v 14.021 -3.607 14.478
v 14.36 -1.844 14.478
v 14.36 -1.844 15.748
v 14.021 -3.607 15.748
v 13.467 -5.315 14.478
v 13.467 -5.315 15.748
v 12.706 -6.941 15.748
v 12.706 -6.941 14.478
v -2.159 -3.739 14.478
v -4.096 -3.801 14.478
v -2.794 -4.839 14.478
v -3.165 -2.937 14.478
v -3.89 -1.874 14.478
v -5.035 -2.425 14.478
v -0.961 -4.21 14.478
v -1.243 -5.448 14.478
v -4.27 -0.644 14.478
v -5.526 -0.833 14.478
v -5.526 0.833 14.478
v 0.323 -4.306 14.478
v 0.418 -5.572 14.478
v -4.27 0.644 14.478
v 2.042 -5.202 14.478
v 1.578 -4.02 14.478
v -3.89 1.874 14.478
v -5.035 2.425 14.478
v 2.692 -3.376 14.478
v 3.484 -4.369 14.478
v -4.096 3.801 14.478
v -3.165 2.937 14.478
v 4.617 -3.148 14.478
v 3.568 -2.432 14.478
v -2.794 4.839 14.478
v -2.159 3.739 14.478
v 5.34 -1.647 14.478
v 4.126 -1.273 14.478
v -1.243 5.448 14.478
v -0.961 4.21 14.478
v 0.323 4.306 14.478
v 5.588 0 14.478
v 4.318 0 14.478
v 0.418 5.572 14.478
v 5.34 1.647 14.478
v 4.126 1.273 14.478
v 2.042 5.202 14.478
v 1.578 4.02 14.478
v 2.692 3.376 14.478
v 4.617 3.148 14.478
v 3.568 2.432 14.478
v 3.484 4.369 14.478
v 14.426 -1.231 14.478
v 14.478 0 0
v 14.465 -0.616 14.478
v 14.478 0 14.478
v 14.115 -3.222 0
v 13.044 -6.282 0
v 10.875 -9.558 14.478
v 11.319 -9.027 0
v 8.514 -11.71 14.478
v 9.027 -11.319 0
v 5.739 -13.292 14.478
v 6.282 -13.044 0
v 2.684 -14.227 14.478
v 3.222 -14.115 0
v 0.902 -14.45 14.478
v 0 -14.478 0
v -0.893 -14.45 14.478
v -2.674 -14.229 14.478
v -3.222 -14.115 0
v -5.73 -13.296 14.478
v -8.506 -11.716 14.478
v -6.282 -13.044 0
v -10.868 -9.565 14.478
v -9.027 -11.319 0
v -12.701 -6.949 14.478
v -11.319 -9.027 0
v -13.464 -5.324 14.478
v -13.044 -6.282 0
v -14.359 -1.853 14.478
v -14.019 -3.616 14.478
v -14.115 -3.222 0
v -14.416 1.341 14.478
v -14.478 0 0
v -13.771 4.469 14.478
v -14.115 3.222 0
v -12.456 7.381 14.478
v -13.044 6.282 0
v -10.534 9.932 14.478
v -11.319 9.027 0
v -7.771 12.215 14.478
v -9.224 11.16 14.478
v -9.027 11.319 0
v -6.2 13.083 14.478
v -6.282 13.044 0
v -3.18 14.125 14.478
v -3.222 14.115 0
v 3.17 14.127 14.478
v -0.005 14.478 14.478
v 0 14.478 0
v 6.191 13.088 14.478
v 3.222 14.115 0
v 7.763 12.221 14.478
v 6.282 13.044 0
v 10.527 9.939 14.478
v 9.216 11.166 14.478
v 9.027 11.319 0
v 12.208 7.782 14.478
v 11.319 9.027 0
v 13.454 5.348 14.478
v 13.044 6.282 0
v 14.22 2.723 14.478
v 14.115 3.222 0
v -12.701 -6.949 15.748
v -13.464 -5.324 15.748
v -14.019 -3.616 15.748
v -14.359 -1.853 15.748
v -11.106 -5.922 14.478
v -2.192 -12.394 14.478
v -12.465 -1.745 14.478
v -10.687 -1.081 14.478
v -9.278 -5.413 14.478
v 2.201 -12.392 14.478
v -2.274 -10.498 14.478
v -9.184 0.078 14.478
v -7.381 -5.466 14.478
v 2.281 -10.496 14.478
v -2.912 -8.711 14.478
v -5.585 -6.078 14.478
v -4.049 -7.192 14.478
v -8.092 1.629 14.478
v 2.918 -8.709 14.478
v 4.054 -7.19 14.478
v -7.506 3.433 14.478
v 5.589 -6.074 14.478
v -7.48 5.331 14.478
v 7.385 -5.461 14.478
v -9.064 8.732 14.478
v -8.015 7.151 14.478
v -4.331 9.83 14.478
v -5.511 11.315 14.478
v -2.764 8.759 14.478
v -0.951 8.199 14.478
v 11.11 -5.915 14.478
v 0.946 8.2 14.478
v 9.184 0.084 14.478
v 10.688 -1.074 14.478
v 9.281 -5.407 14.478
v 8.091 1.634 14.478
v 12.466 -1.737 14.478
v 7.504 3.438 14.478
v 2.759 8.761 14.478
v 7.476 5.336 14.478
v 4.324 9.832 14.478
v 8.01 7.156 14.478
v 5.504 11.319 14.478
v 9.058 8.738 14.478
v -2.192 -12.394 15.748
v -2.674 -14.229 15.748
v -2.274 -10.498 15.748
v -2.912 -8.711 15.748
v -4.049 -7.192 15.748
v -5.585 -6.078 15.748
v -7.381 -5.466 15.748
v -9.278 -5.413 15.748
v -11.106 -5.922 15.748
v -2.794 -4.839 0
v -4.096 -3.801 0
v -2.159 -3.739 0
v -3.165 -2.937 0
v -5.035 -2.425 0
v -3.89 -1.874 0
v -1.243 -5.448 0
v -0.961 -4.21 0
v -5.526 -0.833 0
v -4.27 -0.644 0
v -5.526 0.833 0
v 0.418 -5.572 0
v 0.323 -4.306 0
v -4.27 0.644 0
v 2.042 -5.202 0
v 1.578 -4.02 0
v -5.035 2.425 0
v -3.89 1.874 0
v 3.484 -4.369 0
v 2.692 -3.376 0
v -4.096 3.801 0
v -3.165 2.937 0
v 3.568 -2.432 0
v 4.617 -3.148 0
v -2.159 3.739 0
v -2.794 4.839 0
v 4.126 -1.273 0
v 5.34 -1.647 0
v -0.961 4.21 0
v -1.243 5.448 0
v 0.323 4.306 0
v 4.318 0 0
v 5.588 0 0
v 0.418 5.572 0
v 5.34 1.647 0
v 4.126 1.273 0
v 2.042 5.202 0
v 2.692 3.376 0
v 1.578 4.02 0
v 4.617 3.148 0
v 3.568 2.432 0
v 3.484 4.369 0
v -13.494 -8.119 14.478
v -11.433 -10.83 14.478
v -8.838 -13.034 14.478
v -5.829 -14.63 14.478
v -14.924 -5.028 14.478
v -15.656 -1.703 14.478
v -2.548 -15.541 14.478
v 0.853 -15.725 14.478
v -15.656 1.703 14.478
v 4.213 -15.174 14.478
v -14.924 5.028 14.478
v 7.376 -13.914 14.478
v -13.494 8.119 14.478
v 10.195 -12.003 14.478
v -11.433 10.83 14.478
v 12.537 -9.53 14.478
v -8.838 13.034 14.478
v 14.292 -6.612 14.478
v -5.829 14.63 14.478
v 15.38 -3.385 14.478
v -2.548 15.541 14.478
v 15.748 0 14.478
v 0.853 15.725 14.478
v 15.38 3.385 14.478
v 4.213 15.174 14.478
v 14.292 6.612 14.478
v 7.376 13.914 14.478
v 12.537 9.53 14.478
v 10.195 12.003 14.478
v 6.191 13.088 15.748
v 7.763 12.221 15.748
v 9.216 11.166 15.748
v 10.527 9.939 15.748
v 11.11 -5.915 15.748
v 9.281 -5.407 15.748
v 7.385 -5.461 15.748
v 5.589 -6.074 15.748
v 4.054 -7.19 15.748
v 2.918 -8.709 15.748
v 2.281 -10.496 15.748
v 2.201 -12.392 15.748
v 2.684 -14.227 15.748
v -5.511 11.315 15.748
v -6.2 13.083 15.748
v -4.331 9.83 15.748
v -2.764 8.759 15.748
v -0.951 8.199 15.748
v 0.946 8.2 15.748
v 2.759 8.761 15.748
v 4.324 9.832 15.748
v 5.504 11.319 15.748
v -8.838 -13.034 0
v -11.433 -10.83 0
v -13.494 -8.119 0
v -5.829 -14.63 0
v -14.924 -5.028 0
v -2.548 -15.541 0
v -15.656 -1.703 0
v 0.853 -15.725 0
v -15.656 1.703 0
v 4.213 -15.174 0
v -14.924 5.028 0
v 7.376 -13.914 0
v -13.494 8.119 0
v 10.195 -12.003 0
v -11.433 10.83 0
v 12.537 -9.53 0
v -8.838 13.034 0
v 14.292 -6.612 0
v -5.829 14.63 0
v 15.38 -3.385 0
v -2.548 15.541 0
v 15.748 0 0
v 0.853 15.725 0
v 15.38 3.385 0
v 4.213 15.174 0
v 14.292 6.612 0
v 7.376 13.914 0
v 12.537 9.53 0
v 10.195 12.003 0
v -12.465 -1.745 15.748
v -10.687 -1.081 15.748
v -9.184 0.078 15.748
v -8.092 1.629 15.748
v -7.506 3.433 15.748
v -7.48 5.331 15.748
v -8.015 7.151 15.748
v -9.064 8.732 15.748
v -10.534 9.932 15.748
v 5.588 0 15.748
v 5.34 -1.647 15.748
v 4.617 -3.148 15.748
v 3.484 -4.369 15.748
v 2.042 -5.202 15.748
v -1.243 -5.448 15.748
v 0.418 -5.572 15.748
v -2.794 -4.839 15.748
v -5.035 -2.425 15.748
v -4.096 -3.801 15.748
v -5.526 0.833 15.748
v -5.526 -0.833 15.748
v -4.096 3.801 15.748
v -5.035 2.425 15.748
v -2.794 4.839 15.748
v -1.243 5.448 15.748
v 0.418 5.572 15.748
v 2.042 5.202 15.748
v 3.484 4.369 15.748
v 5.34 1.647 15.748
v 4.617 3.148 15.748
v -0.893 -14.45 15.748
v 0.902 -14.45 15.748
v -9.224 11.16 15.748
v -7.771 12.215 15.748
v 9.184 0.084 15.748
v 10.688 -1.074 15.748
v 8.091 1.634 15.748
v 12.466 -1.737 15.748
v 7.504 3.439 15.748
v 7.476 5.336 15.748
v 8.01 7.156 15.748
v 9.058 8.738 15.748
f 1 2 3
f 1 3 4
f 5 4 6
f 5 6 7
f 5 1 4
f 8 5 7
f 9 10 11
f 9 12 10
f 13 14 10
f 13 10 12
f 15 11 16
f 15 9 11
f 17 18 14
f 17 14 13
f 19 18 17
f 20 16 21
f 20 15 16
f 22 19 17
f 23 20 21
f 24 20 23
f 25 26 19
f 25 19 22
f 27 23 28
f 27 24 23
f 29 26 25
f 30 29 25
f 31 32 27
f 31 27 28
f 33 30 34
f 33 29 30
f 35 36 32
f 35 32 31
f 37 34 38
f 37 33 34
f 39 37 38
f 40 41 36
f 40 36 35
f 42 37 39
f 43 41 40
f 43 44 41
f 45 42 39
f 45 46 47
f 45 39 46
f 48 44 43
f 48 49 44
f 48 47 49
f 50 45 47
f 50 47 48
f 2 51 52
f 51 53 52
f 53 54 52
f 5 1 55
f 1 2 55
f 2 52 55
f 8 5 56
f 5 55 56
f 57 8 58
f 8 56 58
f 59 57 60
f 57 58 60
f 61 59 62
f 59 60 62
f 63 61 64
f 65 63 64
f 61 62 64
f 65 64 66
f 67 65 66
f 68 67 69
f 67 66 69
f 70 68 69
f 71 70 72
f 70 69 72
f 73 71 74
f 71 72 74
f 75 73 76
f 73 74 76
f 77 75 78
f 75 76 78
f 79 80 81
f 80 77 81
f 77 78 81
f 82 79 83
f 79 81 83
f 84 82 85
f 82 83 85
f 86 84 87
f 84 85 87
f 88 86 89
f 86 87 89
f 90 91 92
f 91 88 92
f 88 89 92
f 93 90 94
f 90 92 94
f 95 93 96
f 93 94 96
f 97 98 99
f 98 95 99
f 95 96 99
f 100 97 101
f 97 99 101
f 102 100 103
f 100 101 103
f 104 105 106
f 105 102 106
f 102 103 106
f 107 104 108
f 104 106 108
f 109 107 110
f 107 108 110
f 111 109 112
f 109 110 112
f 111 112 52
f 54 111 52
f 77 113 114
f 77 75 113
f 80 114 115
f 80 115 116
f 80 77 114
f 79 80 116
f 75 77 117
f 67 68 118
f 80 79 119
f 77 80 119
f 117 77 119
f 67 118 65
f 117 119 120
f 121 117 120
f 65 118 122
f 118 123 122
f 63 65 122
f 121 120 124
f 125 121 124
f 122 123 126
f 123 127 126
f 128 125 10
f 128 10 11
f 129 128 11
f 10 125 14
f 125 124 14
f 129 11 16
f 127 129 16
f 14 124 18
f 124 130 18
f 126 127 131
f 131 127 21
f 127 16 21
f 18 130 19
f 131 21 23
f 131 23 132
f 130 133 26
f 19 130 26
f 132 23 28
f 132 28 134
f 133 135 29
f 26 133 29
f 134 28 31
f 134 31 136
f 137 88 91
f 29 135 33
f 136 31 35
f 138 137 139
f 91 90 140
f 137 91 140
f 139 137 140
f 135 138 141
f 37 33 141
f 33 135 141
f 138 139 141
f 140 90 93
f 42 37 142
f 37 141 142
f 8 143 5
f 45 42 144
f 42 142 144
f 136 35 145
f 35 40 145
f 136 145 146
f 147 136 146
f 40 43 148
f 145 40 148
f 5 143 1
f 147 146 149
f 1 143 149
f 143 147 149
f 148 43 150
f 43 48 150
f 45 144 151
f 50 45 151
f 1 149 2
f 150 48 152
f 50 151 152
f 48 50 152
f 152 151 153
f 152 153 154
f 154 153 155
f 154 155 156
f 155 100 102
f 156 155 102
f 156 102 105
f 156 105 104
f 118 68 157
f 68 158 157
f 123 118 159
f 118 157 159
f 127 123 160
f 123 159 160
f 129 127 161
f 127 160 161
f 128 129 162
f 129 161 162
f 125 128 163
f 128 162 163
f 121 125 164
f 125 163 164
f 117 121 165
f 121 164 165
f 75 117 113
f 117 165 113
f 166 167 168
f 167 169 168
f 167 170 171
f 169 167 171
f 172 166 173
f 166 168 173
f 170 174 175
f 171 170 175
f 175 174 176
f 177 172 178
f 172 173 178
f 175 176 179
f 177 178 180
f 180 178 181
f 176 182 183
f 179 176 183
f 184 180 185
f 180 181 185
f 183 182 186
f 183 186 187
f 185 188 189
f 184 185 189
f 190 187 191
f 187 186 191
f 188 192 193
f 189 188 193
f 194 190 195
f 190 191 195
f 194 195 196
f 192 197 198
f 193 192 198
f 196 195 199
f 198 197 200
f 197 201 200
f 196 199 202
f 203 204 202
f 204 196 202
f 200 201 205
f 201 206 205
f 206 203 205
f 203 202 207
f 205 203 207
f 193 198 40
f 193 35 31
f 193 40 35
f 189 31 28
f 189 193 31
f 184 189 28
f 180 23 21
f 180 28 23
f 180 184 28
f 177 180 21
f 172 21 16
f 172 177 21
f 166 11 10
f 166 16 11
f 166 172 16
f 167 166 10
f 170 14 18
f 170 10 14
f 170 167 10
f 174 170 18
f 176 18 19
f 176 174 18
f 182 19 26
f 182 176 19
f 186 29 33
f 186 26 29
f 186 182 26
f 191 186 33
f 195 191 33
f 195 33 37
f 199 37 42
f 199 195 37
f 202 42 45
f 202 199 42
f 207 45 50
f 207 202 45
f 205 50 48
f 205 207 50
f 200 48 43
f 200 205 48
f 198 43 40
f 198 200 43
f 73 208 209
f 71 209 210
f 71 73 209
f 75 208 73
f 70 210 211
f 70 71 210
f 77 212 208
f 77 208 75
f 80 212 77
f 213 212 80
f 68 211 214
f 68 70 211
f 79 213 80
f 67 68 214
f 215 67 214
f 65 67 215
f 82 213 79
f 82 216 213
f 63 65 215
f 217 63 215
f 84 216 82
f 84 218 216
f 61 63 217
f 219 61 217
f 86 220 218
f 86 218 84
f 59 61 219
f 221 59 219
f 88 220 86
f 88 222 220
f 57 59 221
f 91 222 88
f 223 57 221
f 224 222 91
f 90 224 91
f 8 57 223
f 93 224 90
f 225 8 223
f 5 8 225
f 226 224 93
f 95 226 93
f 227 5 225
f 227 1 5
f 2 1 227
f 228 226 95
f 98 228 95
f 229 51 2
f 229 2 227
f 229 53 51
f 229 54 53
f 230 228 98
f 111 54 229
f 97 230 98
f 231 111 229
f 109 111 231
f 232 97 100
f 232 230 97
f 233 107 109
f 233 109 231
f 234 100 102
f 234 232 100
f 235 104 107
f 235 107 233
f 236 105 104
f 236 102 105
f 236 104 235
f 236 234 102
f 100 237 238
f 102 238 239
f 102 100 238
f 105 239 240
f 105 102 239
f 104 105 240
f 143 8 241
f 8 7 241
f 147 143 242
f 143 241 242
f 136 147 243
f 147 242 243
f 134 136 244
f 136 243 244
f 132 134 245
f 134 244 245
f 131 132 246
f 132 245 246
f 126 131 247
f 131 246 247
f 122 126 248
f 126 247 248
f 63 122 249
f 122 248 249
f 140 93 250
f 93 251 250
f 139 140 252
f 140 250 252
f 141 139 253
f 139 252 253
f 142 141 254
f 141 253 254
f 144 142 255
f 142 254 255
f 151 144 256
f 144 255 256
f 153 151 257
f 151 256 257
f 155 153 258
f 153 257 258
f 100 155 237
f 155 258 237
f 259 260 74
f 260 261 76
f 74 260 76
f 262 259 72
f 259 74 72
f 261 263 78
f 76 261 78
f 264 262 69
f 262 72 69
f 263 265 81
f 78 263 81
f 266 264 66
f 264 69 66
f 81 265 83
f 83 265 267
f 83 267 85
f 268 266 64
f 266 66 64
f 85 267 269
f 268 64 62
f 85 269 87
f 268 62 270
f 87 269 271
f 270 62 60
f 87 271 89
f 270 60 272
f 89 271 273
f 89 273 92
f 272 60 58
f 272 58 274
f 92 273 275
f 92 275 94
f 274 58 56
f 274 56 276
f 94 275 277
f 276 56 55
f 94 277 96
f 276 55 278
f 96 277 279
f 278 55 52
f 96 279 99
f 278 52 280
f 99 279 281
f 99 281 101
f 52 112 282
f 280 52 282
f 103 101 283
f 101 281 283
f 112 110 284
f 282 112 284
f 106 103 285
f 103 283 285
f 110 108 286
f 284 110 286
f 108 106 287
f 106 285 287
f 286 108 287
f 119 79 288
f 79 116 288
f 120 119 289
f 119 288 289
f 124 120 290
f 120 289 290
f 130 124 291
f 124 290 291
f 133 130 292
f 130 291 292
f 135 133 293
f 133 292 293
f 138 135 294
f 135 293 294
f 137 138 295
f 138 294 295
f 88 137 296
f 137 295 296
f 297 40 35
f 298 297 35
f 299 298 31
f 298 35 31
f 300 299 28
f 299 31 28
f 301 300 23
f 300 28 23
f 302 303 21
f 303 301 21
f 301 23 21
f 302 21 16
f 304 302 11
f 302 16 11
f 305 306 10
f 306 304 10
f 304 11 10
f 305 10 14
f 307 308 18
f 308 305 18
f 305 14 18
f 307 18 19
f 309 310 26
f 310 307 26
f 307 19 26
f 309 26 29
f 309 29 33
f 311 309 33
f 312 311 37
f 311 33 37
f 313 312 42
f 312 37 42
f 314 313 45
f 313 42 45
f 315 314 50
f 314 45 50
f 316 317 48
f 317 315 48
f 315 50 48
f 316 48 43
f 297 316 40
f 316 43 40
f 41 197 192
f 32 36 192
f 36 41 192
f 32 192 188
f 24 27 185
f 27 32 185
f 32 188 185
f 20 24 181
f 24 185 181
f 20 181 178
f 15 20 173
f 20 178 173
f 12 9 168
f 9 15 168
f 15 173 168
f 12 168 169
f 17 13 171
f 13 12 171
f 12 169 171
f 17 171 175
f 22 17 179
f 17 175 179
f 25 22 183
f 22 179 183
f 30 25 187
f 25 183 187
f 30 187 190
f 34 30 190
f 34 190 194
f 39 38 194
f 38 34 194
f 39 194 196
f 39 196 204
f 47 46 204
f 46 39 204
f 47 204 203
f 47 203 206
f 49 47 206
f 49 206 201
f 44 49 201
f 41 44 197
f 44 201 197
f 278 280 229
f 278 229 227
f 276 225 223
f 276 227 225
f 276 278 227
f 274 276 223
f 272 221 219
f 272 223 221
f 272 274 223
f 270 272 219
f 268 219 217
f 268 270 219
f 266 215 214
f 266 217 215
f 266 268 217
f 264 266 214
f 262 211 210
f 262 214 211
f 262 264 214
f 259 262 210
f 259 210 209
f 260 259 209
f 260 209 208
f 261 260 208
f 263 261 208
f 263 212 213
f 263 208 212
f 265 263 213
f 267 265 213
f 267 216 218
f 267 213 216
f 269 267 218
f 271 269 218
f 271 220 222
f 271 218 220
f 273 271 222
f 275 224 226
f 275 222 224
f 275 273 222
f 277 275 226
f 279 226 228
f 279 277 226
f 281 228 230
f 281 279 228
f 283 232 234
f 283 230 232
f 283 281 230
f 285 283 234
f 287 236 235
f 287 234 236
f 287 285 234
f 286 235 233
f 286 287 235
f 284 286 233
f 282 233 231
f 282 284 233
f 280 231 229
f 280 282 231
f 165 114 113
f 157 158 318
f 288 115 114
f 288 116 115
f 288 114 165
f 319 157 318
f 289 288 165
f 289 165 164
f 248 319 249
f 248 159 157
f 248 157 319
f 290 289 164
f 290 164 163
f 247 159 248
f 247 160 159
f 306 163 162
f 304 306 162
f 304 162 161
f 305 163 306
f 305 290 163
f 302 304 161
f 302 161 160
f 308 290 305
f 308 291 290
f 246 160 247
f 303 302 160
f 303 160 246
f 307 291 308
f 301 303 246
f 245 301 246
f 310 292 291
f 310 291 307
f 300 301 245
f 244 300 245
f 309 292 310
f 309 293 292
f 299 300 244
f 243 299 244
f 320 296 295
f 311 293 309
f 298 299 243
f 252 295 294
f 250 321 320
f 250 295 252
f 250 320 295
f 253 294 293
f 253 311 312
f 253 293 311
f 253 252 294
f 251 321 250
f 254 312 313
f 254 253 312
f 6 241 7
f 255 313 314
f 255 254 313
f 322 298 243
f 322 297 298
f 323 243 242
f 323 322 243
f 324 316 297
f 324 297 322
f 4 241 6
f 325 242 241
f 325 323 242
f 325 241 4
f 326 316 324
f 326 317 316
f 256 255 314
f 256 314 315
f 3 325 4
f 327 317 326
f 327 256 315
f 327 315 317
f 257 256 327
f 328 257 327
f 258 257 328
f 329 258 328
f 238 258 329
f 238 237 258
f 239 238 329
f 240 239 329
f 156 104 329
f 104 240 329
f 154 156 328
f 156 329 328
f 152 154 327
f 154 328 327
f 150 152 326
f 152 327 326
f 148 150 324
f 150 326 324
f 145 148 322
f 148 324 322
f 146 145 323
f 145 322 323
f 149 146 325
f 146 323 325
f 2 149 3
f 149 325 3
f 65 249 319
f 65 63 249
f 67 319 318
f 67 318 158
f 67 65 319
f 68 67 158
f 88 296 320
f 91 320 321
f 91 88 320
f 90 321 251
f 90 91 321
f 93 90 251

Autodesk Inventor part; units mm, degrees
ref_plane "YZ Plane" through (0, 0, 0) normal (1, 0, 0) x (0, 1, 0)
ref_plane "XZ Plane" through (0, 0, 0) normal (0, 1, 0) x (-1, 0, 0)
ref_plane "XY Plane" through (0, 0, 0) normal (0, 0, 1) x (1, 0, 0)
sketch "Sketch1" plane through (0, 0, 0) normal (0, 0, 1) x (1, 0, 0)
  circle A0 centre (0, 0) radius 15.748
  circle A1 centre (0, 0) radius 14.478
  circle A2 centre (0, 0) radius 5.588
  circle A3 centre (0, 0) radius 4.318
  dimension "d0" = 1.27
  dimension "d1" = 8.89
  dimension "d2" = 1.27
  dimension "d3" = 11.176
extrude "Extrusion1" add sketch "Sketch1" along normal blind 14.478
sketch "Sketch2" plane through (0, 0, 14.478) normal (0, 0, 1) x (1, 0, 0)
  circle A0 centre (0, 0) radius 14.478 projected
  circle A1 centre (0, 0) radius 15.748 projected
  circle A2 centre (0, 0) radius 4.318 projected
  circle A3 centre (0, 0) radius 5.588 projected
extrude "Extrusion2" add sketch "Sketch2" along normal blind 1.27 contours A0
sketch "Sketch3" plane through (0, 0, 15.748) normal (0, 0, 1) x (1, 0, 0)
  circle A0 centre (0, 0) radius 14.478 projected
  circle A1 centre (0, 0) radius 4.318 projected
  circle A2 centre (0, 0) radius 14.478 projected
  circle A3 centre (0, 0) radius 15.748 projected
  circle A4 centre (0, 0) radius 14.478 projected
  circle A5 centre (0, 0) radius 15.748 projected
  circle A6 centre (0, 0) radius 4.318 projected
  circle A7 centre (0, 0) radius 5.588 projected
  arc A8 (-6.1998, 13.0834) -> (6.1911, 13.0875) centre (-0.0048, 14.478) ccw
  dimension "d9" = 12.7
extrude "Extrusion3" cut sketch "Sketch3" against normal up to next contours A8 A0 picked at (1.8159, 12.3862)
pattern_circular "Circular Pattern1" count 5 over 360 about axis through (0, 0, 14.478) along (0, 0, 1) of "Extrusion3"
properties part number "Wheel"
